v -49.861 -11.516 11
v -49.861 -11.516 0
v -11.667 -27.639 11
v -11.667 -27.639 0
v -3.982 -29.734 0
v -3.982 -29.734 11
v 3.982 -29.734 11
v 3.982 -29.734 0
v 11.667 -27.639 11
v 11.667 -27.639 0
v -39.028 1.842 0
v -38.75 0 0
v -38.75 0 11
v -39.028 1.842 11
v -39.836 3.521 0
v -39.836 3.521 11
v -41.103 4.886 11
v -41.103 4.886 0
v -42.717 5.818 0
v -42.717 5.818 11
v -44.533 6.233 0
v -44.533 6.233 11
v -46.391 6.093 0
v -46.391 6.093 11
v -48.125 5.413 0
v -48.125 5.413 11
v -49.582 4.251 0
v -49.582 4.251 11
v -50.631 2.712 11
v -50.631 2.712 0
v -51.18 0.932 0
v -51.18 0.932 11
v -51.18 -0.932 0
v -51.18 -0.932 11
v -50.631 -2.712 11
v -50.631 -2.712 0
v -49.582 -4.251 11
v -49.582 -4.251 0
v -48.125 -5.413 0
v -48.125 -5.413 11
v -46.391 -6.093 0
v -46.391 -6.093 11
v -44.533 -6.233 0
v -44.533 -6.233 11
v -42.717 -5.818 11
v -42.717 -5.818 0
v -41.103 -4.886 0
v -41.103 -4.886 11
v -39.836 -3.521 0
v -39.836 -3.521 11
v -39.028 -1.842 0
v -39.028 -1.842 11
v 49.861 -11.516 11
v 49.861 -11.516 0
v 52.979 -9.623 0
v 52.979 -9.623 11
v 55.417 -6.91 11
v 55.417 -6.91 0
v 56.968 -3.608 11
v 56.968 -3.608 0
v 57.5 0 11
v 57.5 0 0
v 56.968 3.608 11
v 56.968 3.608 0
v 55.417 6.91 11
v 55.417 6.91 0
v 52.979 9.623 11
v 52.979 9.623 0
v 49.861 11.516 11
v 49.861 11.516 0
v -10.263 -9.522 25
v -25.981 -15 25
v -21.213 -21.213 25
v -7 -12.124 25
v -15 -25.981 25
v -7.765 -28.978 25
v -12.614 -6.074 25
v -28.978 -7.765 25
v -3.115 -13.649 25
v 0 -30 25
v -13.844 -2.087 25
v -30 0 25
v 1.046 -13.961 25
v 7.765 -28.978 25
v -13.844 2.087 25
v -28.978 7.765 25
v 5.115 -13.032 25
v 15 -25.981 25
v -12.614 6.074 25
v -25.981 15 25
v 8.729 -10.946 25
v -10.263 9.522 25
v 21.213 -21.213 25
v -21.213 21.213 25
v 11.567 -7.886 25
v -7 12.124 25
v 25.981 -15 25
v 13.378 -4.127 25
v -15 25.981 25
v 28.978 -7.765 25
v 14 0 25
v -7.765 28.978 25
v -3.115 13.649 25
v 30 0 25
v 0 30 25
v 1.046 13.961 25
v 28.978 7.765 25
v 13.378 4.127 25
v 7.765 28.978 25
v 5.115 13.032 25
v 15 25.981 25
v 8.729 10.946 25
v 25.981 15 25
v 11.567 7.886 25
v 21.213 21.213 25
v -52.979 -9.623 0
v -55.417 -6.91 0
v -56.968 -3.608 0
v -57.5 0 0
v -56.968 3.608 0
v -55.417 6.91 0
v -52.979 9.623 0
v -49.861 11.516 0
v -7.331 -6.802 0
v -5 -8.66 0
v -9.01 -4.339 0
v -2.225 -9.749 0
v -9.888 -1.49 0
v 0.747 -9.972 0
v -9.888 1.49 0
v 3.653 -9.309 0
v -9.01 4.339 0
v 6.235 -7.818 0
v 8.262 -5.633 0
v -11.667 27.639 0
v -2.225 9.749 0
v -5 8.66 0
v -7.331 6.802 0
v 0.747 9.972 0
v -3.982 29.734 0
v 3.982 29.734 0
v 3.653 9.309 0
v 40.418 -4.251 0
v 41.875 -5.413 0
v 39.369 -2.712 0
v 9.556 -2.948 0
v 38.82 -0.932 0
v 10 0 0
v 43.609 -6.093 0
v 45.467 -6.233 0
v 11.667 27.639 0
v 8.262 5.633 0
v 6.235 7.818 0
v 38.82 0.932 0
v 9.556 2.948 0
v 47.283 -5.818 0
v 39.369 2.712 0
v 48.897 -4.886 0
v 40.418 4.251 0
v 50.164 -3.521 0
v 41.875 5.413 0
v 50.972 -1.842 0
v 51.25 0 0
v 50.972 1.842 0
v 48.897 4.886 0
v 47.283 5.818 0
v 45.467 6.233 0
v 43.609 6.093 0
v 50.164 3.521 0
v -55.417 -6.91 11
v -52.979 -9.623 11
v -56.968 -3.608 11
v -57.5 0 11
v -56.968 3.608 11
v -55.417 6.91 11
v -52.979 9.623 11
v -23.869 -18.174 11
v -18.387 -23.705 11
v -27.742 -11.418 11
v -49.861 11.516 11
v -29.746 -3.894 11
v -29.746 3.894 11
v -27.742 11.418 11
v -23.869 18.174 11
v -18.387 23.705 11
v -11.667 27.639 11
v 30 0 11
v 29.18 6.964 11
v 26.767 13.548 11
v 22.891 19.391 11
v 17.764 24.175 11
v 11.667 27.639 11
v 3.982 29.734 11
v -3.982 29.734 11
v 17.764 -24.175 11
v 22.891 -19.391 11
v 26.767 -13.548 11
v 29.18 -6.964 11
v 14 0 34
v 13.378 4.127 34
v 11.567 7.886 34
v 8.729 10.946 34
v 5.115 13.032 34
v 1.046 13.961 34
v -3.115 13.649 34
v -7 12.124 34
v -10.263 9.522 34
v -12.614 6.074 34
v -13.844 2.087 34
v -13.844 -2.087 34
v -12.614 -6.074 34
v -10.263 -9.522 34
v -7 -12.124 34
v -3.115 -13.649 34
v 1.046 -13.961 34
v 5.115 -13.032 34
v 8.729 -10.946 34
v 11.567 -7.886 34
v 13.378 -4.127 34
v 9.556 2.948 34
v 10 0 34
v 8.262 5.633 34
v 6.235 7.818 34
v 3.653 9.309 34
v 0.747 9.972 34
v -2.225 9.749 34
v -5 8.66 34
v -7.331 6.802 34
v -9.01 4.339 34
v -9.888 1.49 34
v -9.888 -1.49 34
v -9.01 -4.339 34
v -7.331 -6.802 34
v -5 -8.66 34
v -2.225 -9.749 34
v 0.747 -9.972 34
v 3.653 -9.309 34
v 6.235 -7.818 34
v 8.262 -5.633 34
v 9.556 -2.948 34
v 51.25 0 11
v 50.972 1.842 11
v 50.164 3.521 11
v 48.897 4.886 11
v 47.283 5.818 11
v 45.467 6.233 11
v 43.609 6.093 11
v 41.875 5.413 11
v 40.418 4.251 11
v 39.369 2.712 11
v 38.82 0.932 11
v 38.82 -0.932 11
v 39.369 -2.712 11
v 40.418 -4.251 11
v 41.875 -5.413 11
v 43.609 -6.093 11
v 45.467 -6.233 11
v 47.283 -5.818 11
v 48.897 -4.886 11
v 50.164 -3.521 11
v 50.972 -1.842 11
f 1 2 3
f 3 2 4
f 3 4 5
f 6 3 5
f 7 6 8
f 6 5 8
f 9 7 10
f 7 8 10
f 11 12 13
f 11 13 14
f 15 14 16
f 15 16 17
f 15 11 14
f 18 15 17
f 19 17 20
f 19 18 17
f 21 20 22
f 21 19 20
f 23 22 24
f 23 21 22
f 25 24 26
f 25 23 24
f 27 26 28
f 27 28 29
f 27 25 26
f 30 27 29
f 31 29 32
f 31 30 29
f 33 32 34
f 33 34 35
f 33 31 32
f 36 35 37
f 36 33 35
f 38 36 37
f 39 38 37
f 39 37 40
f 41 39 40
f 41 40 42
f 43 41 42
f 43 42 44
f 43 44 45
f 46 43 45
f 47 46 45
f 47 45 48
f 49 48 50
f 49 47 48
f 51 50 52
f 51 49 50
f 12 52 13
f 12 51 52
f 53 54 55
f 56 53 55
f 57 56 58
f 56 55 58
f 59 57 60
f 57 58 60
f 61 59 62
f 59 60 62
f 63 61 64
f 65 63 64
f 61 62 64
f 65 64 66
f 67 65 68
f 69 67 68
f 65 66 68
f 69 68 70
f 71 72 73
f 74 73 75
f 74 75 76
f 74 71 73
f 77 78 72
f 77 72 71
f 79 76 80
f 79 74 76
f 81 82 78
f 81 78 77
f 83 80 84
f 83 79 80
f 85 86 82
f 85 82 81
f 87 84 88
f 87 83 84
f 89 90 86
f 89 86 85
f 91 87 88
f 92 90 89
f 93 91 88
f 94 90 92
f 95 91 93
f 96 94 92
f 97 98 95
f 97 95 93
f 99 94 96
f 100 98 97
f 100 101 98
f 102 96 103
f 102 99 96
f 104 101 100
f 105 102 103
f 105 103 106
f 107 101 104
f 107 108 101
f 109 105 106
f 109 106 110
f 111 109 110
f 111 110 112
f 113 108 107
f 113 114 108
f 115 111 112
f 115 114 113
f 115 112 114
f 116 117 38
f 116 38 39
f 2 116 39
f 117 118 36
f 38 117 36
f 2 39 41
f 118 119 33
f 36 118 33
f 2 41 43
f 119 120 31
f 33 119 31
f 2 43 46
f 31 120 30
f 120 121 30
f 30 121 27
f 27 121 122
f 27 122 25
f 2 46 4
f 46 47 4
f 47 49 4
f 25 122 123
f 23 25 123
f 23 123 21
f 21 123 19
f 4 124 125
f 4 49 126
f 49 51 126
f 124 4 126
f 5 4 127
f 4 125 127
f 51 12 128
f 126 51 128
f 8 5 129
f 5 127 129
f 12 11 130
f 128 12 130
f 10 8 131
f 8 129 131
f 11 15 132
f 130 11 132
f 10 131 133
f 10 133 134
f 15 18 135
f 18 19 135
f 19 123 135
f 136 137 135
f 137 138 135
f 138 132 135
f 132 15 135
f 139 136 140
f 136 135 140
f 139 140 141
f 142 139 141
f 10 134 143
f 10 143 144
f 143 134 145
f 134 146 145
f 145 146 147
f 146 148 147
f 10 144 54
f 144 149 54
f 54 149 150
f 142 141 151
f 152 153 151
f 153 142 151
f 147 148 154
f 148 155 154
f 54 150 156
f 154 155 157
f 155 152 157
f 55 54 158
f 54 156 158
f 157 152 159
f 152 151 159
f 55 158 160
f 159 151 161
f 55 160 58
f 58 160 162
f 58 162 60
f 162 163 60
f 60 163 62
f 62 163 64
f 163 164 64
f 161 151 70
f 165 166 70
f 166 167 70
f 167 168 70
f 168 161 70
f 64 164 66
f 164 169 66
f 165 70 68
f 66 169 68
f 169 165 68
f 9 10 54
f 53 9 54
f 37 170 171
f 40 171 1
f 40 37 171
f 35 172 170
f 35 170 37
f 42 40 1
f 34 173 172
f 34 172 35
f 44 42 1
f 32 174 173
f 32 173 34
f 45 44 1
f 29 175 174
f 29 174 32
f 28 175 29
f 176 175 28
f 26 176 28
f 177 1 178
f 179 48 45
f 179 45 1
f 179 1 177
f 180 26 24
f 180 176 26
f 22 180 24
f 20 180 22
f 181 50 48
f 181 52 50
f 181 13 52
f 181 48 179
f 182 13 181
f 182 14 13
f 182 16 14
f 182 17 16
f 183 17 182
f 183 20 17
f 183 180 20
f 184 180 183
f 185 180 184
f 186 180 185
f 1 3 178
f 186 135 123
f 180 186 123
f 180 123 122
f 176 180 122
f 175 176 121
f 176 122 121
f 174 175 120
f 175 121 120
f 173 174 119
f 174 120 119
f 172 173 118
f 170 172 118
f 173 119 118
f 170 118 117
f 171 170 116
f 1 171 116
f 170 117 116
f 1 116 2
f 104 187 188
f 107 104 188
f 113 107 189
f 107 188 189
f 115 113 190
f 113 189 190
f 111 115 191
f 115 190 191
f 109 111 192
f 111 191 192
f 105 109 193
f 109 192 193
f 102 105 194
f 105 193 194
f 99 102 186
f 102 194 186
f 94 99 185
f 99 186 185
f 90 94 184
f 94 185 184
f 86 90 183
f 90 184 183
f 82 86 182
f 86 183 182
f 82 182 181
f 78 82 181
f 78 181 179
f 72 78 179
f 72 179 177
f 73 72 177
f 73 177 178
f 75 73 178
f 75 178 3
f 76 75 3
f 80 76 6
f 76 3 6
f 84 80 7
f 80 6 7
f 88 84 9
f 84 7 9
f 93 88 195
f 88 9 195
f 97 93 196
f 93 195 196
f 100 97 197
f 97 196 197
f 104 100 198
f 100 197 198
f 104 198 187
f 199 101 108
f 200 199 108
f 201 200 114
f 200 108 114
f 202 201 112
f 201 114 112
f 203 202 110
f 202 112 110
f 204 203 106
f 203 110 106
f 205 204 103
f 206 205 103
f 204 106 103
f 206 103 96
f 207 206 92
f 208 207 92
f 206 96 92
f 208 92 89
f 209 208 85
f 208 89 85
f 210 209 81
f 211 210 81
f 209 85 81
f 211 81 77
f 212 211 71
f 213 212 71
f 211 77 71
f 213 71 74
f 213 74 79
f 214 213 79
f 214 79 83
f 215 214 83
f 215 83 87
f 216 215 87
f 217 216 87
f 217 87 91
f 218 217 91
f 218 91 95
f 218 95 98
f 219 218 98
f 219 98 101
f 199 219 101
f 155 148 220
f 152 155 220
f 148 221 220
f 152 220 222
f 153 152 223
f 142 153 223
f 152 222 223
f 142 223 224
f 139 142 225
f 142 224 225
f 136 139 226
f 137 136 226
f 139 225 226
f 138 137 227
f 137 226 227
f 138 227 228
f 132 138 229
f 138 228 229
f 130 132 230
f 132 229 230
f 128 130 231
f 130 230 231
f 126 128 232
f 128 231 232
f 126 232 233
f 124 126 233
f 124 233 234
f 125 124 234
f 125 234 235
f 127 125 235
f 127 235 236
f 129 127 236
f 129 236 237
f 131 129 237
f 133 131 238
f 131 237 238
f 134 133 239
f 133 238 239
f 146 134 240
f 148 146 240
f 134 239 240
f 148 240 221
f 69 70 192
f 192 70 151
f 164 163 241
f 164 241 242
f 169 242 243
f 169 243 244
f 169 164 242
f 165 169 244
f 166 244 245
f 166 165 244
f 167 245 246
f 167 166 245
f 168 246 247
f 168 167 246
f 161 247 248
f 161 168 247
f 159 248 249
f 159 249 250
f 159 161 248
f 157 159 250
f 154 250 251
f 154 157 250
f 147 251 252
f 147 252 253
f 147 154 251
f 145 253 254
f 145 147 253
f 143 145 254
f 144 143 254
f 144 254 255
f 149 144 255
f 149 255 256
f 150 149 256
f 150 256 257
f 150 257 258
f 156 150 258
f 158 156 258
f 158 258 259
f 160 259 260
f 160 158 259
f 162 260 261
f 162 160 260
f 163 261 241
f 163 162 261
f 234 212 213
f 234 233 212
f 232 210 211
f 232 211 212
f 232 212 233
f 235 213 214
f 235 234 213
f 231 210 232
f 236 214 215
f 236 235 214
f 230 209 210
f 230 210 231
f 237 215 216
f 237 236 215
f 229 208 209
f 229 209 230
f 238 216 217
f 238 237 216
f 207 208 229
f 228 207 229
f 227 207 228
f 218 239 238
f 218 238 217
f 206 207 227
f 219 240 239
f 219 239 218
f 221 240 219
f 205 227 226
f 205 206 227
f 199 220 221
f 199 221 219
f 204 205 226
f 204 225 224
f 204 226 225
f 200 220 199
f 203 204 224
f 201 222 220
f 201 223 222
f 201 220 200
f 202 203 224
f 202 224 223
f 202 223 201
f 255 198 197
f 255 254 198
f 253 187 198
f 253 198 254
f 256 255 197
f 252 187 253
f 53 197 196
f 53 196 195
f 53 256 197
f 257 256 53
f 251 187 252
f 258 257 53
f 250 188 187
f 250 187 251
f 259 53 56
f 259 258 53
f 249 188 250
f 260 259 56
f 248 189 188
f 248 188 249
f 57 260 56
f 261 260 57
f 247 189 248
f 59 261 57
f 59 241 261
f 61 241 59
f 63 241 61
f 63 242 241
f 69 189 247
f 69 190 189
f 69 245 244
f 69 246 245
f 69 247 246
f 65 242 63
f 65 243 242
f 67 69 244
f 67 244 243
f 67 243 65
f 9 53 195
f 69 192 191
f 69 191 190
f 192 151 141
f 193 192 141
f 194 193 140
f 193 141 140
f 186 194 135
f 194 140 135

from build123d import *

# Parameters (mm, degrees)
F0_R      = 6.25
F1_DEPTH  = 11
F2_R      = 30
F3_DEPTH  = 25
F4_R      = 14
F4_R_2    = 10
F5_DEPTH  = 34
F5_FACE_R = 10
F6_DEPTH  = 25


with BuildPart() as f1:
    # F0 (on Top) → F1 (new body)
    with BuildSketch(Plane.XY):
        with BuildLine():
            Line((-49.861111, -11.516058), (-11.666667, -27.63854))
            ThreePointArc((-11.666667, -27.63854), (0, -30), (11.666667, -27.63854))
            Line((11.666667, -27.63854), (49.861111, -11.516058))
            ThreePointArc((49.861111, -11.516058), (57.5, 0), (49.861111, 11.516058))
            Line((49.861111, 11.516058), (11.666667, 27.63854))
            ThreePointArc((11.666667, 27.63854), (0, 30), (-11.666667, 27.63854))
            Line((-11.666667, 27.63854), (-49.861111, 11.516058))
            ThreePointArc((-49.861111, 11.516058), (-57.5, 0), (-49.861111, -11.516058))
        make_face()
        with Locations((-45, 0)):
            Circle(F0_R, mode=Mode.SUBTRACT)
        with Locations((45, 0)):
            Circle(F0_R, mode=Mode.SUBTRACT)
    extrude(amount=F1_DEPTH)

    # F2 (on Top) → F3 (join)
    with BuildSketch(Plane.XY):
        Circle(F2_R)
    extrude(amount=F3_DEPTH)

    # F4 (on Top) → F5 (join)
    with BuildSketch(Plane.XY):
        Circle(F4_R)
        Circle(F4_R_2, mode=Mode.SUBTRACT)
    extrude(amount=F5_DEPTH)

    # F5_face (on face) → F6 (cut)
    with BuildSketch(Plane.XY.offset(25)):
        Circle(F5_FACE_R)
    extrude(amount=-F6_DEPTH, mode=Mode.SUBTRACT)


solid = f1.part
